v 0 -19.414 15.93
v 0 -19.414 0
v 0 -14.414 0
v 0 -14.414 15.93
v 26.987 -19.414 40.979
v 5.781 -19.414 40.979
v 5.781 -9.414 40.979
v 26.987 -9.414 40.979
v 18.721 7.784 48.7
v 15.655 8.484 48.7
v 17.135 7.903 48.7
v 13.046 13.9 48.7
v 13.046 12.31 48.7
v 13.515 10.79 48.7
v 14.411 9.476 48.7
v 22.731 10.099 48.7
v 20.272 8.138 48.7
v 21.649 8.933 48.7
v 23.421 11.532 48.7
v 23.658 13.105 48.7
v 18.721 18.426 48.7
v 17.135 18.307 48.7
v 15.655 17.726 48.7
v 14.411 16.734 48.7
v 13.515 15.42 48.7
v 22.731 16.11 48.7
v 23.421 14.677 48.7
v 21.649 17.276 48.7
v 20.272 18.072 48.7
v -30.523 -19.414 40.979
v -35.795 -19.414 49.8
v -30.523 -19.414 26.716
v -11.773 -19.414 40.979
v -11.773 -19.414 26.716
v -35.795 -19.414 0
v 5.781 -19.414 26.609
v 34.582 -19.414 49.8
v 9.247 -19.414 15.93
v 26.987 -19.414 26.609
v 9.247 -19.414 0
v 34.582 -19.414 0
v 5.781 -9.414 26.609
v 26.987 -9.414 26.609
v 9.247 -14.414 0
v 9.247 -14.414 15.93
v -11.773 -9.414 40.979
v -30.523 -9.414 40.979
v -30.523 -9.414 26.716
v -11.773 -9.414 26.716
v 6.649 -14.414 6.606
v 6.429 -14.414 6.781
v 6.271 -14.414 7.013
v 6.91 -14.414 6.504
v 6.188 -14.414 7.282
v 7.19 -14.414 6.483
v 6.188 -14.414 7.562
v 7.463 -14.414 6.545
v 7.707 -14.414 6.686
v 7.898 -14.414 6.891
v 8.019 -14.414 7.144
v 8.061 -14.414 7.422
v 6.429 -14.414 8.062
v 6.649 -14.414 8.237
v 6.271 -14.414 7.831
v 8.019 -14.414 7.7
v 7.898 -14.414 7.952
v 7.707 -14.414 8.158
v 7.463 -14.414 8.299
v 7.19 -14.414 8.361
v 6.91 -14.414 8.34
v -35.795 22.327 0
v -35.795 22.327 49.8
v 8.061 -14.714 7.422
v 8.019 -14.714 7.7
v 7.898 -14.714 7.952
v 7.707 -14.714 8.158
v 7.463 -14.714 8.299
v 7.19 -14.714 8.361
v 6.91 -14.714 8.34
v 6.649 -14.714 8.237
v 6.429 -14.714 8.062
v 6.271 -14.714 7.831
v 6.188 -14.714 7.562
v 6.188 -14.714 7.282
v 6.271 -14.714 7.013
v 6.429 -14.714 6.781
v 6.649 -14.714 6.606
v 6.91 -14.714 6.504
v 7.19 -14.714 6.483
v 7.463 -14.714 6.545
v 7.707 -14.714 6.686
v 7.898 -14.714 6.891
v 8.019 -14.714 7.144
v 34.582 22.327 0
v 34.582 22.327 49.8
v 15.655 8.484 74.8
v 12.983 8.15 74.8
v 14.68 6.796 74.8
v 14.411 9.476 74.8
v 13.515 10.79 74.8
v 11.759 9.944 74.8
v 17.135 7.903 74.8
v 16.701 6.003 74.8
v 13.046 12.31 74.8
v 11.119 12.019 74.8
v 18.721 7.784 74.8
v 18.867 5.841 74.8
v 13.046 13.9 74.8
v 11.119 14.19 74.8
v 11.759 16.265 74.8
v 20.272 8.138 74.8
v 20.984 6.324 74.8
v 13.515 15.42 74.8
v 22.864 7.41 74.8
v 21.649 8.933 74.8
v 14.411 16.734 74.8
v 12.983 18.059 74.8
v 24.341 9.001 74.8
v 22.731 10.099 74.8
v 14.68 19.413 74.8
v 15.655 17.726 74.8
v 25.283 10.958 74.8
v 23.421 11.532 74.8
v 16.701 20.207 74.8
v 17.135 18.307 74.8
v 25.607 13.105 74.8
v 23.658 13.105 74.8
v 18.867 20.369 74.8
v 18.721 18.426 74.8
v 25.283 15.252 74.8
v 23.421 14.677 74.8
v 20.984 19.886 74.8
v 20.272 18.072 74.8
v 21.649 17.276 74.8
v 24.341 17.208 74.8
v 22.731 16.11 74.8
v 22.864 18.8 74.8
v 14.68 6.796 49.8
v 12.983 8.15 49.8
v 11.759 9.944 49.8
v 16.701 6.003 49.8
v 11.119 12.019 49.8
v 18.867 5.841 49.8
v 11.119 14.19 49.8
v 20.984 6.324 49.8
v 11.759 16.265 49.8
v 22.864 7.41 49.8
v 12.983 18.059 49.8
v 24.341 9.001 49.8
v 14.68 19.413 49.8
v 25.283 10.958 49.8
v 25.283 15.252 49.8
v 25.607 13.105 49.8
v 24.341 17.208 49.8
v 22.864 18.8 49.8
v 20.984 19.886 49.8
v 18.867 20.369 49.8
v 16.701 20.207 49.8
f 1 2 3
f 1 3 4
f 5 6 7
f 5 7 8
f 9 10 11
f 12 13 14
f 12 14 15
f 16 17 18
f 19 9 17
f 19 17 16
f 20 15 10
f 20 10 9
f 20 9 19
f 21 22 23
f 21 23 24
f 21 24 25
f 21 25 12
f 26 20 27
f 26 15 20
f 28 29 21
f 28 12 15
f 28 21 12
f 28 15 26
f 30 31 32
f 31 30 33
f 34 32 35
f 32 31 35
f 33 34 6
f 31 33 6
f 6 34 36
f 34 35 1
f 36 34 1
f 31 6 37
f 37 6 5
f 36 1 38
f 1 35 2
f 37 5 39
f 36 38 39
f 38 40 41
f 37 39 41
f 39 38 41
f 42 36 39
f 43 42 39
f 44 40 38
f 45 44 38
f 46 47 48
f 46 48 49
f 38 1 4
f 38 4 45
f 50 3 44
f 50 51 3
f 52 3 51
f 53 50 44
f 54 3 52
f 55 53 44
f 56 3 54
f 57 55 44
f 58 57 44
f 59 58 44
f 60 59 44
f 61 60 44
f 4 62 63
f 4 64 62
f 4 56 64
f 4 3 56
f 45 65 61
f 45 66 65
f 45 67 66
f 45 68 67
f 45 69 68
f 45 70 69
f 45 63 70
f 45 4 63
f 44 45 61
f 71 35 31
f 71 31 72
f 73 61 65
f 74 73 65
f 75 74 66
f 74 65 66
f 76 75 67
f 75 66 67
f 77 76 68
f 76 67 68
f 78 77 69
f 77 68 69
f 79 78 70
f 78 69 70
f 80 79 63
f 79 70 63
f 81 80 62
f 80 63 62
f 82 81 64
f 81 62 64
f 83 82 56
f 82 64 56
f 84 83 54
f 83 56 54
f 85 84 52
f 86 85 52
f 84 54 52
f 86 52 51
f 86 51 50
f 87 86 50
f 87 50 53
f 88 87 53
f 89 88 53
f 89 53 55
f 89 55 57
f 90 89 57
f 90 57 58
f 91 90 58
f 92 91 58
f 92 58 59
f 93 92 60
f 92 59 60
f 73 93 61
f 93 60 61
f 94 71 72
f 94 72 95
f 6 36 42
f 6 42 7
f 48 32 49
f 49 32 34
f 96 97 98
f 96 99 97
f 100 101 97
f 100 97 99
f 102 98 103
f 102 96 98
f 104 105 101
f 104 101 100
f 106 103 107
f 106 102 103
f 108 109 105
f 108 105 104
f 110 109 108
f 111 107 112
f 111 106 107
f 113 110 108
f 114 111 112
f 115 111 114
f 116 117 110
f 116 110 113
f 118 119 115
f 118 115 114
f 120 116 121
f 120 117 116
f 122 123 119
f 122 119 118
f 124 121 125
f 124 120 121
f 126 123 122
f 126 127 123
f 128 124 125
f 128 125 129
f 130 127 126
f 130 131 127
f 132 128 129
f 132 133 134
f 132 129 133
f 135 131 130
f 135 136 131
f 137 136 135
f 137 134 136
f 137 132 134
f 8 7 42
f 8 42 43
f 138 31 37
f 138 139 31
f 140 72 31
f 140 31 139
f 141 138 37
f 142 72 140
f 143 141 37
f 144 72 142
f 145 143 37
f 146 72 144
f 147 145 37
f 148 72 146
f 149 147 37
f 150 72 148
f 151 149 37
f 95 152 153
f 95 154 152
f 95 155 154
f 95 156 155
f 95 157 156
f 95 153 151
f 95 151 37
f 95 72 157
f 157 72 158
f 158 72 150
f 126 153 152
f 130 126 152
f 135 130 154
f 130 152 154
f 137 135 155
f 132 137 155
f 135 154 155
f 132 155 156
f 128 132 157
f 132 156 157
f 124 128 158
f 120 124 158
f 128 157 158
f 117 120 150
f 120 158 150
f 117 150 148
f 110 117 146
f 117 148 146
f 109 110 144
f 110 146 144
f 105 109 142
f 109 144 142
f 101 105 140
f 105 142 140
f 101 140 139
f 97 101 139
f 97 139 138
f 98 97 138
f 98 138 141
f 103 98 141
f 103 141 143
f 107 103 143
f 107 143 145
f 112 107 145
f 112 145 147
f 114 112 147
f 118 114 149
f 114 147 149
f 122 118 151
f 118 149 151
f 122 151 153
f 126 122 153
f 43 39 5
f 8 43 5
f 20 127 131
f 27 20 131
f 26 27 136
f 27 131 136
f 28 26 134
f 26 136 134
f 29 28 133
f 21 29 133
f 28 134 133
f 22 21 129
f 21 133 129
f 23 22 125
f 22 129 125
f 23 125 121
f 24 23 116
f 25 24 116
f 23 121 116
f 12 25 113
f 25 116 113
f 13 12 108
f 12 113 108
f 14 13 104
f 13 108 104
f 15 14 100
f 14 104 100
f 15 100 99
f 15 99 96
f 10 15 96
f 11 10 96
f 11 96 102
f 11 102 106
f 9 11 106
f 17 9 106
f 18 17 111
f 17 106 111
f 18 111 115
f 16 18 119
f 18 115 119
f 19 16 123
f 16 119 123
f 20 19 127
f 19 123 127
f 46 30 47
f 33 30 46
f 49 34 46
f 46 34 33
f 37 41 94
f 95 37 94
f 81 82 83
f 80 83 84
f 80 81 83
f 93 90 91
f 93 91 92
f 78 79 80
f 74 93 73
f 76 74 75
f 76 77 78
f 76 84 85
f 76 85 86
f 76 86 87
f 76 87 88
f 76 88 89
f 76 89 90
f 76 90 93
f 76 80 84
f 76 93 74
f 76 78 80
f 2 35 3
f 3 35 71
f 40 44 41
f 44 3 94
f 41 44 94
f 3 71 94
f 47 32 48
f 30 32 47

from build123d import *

# Parameters (mm, degrees)
F0_W      = 70.3775063157
F0_H      = 41.7411420494
F1_DEPTH  = 49.8
F2_W      = 9.2471539974
F2_H      = 15.9300006926
F3_DEPTH  = 5
F4_W      = 18.7503434718
F4_H      = 14.2625961453
F4_W_2    = 21.2060459889
F4_H_2    = 14.3702477217
F5_DEPTH  = 10
F6_R      = 7.2844766826
F7_DEPTH  = 25
F8_R      = 5.3356487736
F9_DEPTH  = 26.1
F10_R     = 0.9417381486
F11_DEPTH = 0.3


with BuildPart() as f1:
    # F0 (on Top) → F1 (new body)
    with BuildSketch(Plane.XY):
        with Locations((-0.606700778, 1.4560865238)):
            Rectangle(F0_W, F0_H)
    extrude(amount=F1_DEPTH)

    # F2 (on face) → F3 (cut)
    with BuildSketch(Plane.XZ.offset(19.4144845009)):
        with Locations((4.6235769987, 7.9650003463)):
            Rectangle(F2_W, F2_H)
    extrude(amount=-F3_DEPTH, mode=Mode.SUBTRACT)

    # F4 (on face) → F5 (cut)
    with BuildSketch(Plane.XZ.offset(19.4144845009)):
        with Locations((-21.1479142308, 33.8475396857)):
            Rectangle(F4_W, F4_H)
        with Locations((16.3835778367, 33.7937138975)):
            Rectangle(F4_W_2, F4_H_2)
    extrude(amount=-F5_DEPTH, mode=Mode.SUBTRACT)

    # F6 (on face) → F7 (join)
    with BuildSketch(Plane.XY.offset(49.8)):
        with Locations((18.3224212378, 13.1047777832)):
            Circle(F6_R)
    extrude(amount=F7_DEPTH)

    # F8 (on face) → F9 (cut)
    with BuildSketch(Plane.XY.offset(74.8)):
        with Locations((18.3224212378, 13.1047777832)):
            Circle(F8_R)
    extrude(amount=-F9_DEPTH, mode=Mode.SUBTRACT)

    # F10 (on face) → F11 (join)
    with BuildSketch(Plane.XZ.offset(14.4144845009)):
        with Locations((7.1194134653, 7.4219265953)):
            Circle(F10_R)
    extrude(amount=F11_DEPTH)


solid = f1.part
